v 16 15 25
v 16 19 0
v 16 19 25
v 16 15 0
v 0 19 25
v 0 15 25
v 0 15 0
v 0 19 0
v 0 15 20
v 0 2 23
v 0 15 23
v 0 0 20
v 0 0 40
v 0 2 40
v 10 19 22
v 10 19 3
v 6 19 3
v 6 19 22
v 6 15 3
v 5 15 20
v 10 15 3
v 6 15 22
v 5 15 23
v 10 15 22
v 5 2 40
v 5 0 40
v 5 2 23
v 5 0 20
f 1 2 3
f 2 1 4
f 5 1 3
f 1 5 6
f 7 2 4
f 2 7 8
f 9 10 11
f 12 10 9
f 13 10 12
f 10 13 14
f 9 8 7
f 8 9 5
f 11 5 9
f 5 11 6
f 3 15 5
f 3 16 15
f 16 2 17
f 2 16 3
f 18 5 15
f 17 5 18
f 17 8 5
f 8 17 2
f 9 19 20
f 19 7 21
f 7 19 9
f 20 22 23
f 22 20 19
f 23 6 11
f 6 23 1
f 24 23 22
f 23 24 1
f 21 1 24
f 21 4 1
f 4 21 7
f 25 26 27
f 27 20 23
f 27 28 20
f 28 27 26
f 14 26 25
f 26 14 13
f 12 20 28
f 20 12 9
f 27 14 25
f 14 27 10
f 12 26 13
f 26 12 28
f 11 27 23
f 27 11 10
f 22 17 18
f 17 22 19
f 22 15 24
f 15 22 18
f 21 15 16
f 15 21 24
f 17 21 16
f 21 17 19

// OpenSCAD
// optical Z endstop

$fn=64;

modules = 0;

module rails() {
   translate([-30,0,0]) cube([30,100,30],false);
   translate([5,60,-14]) cube([30,20,20],false);
}

module endstop() {
   difference() {
      union() {
         color([1,0,0]) cube([10,1.5,33],false);
         color([1,1,1]) translate([0,-7,27]) cube([10,7,6],false);
         color([0,0,0]) translate([2,1.5,0.8]) {
            cube([6,3,24.5],false);
            translate([0,3,6]) cube([6,7.2,4.25],false);
            translate([0,3,13.7]) cube([6,7.2,4.25],false);
         }
      }   
      translate([5,-1,3.5]) rotate([-90,0,0]) cylinder(d=3,h=20,center=false);
      translate([5,-1,22.4]) rotate([-90,0,0]) cylinder(d=3,h=20,center=false);
   }
}

if(1 == modules) {
   rails();
   translate([7,33+31,20]) rotate([90,90,0]) endstop();
}

module 2020_pin() {
   difference() {
      union() {
         translate([0,15,0]) cube([16,4,25],false);
         translate([0,0,20]) cube([5,2,20],false);
         translate([0,0,20]) cube([5,16,3],false);
      }
      hull() {
         translate([8,10,5]) cube([4,20,4],center=true);
         translate([8,10,20]) cube([4,20,4],center=true);
      }
   }
}

module 3030_case() {
   difference() {
      union() {
         cube([7,50,20],false);
         translate([-2,0,6]) cube([2,50,8],false);
      }
      translate([5,24.5,5]) cube([2.1,23,10],false);
      translate([3,-1,-1]) cube([5,24,22],false);
      hull() {
         translate([-4,-2,10]) rotate([0,90,0]) cylinder(d=4,h=10,center=false);
         translate([-4,20,10]) rotate([0,90,0]) cylinder(d=4,h=10,center=false);
      }
      translate([-4,26.6,10]) {
         rotate([0,90,0]) cylinder(d=4,h=20,center=false);
         translate([3,0,0]) cube([2.1,5.43,5.43],true);
      }
      translate([-4,45.5,10]) {
         rotate([0,90,0]) cylinder(d=4,h=20,center=false);
         translate([3,0,0]) cube([2.1,5.43,5.43],true);
      }
   }
}

module 3030_m3_nut() {
   difference() {
      union() {
         hull() {
            cylinder(d=7,h=3,center=false);
            translate([7,0,0]) cylinder(d=7,h=3,center=false);
         }
      }
      translate([3.5,0,-1]) cylinder(d=4,h=10,center=false);
      translate([3.5,0,1]) cube([5.43,5.43,2.1],true);
   }
}

// 3030_m3_nut();

/*translate([13,50,-17])*/  2020_pin();
/*translate([0,15,5])*/ // 3030_case();
